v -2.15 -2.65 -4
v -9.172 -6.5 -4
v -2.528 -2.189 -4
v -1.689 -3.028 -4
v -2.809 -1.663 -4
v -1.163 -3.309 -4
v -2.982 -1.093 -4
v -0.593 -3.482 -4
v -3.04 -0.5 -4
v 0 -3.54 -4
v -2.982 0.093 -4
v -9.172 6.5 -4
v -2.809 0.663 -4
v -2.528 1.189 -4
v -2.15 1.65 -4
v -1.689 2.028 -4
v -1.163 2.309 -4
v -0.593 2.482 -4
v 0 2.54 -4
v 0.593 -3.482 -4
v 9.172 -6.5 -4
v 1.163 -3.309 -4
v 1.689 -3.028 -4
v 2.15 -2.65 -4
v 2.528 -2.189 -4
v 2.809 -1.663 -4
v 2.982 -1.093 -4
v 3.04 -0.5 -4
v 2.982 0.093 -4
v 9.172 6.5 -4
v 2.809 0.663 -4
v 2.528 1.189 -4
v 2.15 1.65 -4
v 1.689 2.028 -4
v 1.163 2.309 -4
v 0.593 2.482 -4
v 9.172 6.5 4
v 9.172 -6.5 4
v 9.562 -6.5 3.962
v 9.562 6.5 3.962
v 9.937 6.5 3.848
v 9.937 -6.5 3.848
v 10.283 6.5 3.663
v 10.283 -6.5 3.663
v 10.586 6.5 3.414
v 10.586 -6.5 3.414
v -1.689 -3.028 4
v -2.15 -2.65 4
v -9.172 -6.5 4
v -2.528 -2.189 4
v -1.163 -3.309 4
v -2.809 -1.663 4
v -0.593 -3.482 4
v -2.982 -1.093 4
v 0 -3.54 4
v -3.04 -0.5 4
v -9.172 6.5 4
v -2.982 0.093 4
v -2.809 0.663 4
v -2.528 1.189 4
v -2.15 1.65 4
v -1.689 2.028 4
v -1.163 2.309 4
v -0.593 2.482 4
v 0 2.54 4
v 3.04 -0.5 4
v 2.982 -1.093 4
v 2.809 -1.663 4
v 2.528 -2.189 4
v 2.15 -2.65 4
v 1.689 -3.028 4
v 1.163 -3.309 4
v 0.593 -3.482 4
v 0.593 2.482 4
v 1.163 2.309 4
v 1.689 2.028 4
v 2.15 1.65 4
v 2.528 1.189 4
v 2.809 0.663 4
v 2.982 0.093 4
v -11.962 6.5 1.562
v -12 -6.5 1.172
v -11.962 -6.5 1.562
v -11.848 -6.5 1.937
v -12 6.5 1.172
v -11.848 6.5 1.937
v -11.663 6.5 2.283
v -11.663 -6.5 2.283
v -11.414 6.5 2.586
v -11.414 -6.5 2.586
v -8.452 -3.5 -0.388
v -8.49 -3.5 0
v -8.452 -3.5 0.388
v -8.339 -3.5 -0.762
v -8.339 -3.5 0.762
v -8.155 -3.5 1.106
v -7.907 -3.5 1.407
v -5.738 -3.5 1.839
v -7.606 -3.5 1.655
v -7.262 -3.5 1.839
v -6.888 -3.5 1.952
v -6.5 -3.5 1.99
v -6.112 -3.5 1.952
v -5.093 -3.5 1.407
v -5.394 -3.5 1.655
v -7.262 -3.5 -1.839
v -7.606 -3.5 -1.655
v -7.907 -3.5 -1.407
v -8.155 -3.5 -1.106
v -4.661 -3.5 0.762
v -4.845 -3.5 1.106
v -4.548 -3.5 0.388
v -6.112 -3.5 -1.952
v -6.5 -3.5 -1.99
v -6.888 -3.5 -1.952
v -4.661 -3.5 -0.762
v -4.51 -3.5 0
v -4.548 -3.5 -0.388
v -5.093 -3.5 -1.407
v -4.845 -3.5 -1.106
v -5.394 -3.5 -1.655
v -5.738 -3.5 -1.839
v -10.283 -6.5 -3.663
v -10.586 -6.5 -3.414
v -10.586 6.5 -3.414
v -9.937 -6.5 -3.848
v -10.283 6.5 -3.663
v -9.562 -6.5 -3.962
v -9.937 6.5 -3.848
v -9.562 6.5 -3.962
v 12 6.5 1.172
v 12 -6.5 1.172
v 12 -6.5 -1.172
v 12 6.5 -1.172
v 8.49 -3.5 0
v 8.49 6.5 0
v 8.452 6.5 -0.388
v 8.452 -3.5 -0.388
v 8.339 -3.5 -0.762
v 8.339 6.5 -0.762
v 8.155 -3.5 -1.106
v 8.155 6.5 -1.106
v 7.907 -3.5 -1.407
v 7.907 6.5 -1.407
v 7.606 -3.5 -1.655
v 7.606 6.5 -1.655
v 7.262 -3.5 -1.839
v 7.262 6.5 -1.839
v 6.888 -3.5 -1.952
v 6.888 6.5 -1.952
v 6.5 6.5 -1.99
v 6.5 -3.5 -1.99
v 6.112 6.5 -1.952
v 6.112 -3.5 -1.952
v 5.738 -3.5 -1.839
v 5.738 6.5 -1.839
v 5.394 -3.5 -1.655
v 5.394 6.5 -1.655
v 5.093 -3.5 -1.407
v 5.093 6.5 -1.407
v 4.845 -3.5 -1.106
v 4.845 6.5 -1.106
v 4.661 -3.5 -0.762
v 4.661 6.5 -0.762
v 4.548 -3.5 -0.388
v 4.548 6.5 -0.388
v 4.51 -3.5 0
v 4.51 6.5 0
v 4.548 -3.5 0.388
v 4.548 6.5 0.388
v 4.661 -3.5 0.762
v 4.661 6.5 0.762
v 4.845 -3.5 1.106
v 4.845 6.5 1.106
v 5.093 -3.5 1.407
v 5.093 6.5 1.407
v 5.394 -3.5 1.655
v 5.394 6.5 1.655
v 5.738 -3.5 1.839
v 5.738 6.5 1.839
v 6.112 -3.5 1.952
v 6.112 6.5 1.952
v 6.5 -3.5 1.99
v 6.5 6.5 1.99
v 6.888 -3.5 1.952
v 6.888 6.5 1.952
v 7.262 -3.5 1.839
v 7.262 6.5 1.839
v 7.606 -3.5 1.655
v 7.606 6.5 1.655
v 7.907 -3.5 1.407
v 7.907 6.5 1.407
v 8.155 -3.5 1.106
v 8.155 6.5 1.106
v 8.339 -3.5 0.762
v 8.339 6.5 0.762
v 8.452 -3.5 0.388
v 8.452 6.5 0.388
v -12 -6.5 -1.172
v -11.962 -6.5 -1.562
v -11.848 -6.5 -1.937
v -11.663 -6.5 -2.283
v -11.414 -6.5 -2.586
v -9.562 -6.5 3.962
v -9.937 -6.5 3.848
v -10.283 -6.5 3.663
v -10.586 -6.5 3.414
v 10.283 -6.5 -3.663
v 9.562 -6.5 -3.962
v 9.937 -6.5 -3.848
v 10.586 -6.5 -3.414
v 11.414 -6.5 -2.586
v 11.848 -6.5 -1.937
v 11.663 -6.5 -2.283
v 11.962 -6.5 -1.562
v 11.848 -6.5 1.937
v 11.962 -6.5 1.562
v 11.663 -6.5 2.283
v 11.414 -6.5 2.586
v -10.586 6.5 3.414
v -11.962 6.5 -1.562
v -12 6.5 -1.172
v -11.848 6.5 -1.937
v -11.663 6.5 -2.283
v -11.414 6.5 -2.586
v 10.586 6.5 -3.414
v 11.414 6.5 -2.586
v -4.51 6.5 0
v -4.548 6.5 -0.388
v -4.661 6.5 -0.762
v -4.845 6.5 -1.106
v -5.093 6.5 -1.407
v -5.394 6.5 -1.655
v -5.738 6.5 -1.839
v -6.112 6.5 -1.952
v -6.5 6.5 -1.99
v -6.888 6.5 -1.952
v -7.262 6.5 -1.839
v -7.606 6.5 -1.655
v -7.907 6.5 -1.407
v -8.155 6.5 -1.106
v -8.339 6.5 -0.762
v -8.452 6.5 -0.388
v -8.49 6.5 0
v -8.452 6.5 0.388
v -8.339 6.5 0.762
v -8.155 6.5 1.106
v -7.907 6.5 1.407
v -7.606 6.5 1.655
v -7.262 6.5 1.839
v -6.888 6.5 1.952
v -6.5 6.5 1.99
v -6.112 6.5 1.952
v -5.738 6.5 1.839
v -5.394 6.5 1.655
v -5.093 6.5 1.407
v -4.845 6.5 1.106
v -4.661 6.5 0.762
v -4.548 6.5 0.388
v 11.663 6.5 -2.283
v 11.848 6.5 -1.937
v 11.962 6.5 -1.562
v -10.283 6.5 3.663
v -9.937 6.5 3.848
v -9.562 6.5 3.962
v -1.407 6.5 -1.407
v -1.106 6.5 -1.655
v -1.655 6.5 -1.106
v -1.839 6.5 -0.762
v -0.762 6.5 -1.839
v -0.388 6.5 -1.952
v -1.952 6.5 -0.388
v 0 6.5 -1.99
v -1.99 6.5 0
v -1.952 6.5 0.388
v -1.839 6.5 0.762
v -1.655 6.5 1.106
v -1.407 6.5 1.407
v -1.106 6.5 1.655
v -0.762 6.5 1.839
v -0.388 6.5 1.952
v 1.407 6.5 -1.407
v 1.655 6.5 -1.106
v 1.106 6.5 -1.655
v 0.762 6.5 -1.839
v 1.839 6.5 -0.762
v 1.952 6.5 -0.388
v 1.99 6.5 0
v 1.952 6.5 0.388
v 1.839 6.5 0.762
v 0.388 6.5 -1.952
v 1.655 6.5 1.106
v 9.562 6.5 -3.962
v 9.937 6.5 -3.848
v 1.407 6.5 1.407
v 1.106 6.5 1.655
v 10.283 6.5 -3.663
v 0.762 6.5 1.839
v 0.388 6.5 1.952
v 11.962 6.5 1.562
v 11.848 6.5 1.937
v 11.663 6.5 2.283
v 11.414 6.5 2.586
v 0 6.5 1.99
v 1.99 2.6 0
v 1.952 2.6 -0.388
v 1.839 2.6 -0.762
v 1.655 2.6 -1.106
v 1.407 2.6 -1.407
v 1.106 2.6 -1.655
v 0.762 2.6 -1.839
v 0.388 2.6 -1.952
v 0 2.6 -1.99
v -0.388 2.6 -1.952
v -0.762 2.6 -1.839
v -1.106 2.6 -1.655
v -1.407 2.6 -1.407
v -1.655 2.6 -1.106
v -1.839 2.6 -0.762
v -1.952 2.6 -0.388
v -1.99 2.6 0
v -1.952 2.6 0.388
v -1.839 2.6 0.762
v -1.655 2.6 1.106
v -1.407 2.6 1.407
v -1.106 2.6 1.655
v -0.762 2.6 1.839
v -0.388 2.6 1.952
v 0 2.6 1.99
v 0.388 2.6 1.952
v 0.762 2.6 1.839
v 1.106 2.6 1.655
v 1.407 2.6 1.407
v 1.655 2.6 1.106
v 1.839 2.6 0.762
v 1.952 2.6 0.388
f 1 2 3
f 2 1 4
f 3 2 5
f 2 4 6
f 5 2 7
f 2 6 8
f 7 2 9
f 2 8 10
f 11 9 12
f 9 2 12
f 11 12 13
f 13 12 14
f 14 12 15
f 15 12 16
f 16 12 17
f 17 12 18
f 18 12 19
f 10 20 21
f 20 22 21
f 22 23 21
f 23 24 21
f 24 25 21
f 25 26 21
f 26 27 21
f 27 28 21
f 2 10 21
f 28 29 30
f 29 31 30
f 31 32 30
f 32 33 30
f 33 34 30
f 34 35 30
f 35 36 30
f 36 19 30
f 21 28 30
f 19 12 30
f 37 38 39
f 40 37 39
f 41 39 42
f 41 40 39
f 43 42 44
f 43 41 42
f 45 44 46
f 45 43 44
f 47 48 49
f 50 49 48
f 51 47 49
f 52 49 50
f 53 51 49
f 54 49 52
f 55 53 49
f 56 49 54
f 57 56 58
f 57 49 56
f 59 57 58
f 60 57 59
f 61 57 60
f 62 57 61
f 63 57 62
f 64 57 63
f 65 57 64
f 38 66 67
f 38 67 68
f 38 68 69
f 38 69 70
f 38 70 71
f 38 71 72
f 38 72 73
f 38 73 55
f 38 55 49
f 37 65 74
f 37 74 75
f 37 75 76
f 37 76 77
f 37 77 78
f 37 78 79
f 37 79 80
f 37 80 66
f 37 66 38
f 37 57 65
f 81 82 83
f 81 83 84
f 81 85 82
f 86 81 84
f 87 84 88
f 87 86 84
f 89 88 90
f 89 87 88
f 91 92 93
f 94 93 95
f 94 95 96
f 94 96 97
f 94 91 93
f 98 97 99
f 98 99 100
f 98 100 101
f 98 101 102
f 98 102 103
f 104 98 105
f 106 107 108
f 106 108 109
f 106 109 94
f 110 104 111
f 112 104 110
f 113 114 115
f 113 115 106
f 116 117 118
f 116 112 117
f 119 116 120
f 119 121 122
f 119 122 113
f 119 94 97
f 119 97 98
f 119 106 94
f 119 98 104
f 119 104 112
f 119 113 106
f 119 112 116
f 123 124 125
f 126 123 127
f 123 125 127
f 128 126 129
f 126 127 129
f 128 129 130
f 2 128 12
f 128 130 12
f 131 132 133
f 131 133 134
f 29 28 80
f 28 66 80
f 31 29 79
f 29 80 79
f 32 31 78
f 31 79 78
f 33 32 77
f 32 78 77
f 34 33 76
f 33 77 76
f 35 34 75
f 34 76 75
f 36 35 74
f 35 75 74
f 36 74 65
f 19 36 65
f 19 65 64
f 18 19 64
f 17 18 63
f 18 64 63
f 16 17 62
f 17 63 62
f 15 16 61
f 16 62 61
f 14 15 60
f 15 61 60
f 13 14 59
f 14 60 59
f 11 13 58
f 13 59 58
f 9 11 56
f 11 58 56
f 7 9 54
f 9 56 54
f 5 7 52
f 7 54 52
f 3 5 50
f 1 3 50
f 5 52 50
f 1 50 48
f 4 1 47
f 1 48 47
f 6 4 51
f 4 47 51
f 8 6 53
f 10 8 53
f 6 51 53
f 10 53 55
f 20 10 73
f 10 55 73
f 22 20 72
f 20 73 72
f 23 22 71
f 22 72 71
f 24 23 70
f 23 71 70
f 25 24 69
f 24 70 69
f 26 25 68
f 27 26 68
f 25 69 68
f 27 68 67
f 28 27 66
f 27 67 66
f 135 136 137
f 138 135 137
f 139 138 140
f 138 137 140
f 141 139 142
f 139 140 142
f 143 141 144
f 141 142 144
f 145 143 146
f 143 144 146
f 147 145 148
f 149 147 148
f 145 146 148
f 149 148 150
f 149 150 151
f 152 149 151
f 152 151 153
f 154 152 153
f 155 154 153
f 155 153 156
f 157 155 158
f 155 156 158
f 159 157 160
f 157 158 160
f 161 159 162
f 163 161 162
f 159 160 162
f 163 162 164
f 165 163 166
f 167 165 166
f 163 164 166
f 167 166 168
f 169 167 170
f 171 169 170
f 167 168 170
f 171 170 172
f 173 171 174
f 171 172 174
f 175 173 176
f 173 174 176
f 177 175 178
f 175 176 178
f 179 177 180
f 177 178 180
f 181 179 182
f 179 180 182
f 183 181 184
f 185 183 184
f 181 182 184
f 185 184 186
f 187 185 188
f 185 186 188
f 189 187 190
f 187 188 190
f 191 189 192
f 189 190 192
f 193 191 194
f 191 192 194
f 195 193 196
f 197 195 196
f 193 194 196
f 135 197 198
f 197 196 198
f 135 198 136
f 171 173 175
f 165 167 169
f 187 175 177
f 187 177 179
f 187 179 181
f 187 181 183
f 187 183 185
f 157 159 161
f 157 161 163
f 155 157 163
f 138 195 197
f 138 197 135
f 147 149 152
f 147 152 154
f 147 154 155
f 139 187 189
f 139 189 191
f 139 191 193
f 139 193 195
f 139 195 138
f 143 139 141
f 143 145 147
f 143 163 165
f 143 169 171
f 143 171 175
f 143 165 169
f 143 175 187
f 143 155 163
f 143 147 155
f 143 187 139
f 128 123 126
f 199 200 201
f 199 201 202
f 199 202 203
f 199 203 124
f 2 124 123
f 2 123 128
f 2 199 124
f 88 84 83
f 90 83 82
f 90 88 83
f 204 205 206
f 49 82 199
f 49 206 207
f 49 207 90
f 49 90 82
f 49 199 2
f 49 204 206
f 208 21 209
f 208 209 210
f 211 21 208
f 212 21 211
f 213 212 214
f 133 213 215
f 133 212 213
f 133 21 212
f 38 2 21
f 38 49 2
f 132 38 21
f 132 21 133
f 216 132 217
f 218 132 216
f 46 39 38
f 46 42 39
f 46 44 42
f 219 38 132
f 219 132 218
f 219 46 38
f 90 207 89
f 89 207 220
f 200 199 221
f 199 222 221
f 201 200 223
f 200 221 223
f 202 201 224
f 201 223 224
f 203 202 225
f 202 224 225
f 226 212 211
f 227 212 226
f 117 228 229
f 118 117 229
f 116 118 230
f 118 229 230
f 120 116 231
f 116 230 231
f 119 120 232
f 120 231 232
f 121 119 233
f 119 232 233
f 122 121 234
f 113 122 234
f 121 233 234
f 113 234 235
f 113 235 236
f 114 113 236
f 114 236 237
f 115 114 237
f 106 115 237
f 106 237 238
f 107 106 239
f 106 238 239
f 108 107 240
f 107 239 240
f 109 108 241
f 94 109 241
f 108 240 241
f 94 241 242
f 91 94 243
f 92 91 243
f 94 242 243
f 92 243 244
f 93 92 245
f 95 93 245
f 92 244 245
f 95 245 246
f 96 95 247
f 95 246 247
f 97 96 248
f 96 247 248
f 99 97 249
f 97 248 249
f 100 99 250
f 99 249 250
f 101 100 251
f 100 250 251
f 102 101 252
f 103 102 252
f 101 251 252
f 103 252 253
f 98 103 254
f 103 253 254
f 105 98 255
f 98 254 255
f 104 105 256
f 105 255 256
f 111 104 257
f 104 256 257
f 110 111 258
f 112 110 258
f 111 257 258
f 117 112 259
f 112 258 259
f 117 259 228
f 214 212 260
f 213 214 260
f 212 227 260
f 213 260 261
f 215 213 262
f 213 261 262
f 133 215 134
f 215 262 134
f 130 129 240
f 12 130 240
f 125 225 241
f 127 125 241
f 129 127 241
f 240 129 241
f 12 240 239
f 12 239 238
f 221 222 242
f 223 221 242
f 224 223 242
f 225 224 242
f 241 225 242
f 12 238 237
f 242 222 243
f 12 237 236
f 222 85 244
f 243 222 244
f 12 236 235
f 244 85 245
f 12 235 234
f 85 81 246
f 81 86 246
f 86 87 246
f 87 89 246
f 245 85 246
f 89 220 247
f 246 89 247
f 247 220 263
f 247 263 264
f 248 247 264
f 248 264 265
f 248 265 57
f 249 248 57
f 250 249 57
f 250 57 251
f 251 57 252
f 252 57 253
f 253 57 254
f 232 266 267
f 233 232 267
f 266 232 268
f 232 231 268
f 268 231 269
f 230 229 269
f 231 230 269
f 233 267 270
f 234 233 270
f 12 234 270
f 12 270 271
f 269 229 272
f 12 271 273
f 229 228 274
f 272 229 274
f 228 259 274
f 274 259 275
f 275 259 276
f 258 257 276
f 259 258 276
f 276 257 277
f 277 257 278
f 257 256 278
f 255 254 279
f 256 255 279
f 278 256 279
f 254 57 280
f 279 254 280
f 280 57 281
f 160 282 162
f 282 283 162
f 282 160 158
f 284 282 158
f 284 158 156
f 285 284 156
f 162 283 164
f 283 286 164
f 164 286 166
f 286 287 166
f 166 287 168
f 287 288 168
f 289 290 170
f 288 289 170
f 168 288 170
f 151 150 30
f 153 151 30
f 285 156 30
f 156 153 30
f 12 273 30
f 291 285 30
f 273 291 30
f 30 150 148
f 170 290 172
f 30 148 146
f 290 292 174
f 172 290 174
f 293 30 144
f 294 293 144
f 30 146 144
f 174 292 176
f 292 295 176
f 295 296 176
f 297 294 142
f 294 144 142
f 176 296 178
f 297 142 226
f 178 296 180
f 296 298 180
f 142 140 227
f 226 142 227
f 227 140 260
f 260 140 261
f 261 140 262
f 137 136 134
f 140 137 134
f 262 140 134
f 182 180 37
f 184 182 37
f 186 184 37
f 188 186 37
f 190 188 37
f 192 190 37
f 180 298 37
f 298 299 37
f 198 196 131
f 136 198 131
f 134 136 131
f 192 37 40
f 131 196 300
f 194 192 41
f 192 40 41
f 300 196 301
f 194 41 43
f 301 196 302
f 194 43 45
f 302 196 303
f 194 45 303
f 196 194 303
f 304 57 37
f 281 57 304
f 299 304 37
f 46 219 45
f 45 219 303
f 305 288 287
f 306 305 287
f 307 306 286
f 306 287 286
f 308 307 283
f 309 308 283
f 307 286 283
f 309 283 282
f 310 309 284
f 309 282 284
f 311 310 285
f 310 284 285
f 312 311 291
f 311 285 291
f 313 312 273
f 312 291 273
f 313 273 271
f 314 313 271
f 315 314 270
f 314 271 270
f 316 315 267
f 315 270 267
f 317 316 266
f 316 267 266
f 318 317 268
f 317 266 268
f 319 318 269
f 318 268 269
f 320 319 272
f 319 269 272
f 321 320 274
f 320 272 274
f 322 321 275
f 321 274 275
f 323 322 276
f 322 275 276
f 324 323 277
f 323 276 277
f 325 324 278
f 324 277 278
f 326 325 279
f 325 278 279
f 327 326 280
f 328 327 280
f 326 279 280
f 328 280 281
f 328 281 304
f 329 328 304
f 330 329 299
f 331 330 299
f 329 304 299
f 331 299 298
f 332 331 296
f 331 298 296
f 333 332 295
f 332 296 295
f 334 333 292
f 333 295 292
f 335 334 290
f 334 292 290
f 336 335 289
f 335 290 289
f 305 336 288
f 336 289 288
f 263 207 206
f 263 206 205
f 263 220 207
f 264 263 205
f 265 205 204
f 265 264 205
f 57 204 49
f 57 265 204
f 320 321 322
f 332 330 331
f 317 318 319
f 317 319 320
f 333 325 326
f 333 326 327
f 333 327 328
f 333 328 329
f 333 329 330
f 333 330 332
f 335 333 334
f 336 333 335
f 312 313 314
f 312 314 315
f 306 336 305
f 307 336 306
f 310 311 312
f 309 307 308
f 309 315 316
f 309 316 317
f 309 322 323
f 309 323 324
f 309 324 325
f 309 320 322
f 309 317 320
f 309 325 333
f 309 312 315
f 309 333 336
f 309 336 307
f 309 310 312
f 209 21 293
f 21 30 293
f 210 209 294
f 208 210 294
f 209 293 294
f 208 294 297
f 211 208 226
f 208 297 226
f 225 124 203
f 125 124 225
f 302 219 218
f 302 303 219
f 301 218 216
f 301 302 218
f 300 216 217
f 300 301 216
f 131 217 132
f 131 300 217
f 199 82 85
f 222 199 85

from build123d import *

# Parameters (mm, degrees)
BOSS_EXTRUDE1_DEPTH      = 4
BOSS_EXTRUDE1_DEPTH_BACK = 4
SKETCH1_W                = 24
SKETCH1_H                = 13
CUT_EXTRUDE1_DEPTH       = 7
CUT_EXTRUDE1_DEPTH_BACK  = 7
SKETCH3_R                = 3.04
SKETCH4_R                = 1.99
CUT_EXTRUDE2_DEPTH       = 10
SKETCH5_R                = 1.99
CUT_EXTRUDE4_DEPTH       = 3.9
CHAMFER1_SIZE            = 2
FILLET1_R                = 2


with BuildPart() as part:
    # Sketch1 → Boss-Extrude1 (new, two sides: drawn at the far end of the back side and taken through both)
    with BuildSketch(Plane.XY.offset(-BOSS_EXTRUDE1_DEPTH_BACK)):
        Rectangle(SKETCH1_W, SKETCH1_H)
    extrude(amount=BOSS_EXTRUDE1_DEPTH + BOSS_EXTRUDE1_DEPTH_BACK)

    # Sketch3 → Cut-Extrude1 (cut, two sides: drawn at the far end of the back side and taken through both)
    with BuildSketch(Plane.XY.offset(-CUT_EXTRUDE1_DEPTH_BACK)):
        with Locations((0, -0.5)):
            Circle(SKETCH3_R)
    extrude(amount=CUT_EXTRUDE1_DEPTH + CUT_EXTRUDE1_DEPTH_BACK, mode=Mode.SUBTRACT)

    # Sketch4 → Cut-Extrude2 (cut)
    with BuildSketch(Plane(origin=(0, 6.5, 0), x_dir=(1, 0, 0), z_dir=(0, 1, 0))):
        with Locations((-6.5, 0)):
            Circle(SKETCH4_R)
        with Locations((6.5, 0)):
            Circle(SKETCH4_R)
    extrude(amount=-CUT_EXTRUDE2_DEPTH, mode=Mode.SUBTRACT)

    # Sketch5 → Cut-Extrude4 (cut)
    with BuildSketch(Plane(origin=(0, 6.5, 0), x_dir=(1, 0, 0), z_dir=(0, 1, 0))):
        Circle(SKETCH5_R)
    extrude(amount=-CUT_EXTRUDE4_DEPTH, mode=Mode.SUBTRACT)

    # Chamfer1
    chamfer1_edges = [part.edges().sort_by_distance(p)[0] for p in [
        (12, 0, 4),
        (12, 0, -4),
        (-12, 0, 4),
        (-12, 0, -4),
    ]]
    chamfer(chamfer1_edges, length=CHAMFER1_SIZE)

    # Fillet1
    fillet1_edges = [part.edges().sort_by_distance(p)[0] for p in [
        (10, 0, 4),
        (-10, 0, 4),
        (-12, 0, 2),
        (-12, 0, -2),
        (-10, 0, -4),
        (12, 0, 2),
        (12, 0, -2),
        (10, 0, -4),
    ]]
    fillet(fillet1_edges, radius=FILLET1_R)


solid = part.part
